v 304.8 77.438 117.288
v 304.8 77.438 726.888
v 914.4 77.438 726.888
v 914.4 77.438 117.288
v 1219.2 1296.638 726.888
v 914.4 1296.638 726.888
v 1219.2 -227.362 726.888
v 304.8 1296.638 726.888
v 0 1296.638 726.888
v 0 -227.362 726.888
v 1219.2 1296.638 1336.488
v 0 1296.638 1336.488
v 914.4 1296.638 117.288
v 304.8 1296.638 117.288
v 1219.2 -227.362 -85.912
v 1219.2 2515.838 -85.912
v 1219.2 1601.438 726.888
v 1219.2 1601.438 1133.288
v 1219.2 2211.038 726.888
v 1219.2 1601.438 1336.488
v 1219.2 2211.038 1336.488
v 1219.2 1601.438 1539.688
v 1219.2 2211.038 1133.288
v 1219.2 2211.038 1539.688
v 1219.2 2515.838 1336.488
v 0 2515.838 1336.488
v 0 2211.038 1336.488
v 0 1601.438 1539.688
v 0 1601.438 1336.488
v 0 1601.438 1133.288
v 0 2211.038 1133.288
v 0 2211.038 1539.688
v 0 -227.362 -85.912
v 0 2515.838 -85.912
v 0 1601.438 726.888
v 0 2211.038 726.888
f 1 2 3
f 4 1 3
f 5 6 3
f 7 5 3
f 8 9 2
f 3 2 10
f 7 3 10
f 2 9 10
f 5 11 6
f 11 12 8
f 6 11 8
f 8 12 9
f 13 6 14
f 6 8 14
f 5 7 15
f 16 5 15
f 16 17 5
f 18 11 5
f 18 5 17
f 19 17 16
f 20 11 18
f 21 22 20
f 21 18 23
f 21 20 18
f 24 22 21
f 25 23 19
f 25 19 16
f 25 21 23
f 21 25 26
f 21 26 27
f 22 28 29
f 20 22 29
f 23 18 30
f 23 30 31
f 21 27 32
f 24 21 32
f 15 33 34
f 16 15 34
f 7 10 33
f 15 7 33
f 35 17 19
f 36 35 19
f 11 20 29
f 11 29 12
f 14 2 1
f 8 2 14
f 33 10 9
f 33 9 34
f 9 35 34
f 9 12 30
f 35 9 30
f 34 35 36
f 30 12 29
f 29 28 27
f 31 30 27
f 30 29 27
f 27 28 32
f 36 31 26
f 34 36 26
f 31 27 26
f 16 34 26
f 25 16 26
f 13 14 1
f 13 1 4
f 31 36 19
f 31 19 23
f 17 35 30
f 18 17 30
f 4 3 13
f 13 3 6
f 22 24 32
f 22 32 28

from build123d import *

# Parameters (mm, degrees)
F1_DEPTH = 1219.2
F2_W     = 609.6
F2_H     = 406.4
F3_DEPTH = 1219.2
F4_W     = 609.6
F4_H     = 1219.2
F5_DEPTH = 609.6


with BuildPart() as f1:
    # F0 (on Right) → F1 (new body)
    with BuildSketch(Plane.YZ):
        Polygon((-227.362469, 726.887877), (-227.362469, -85.912123), (2515.837531, -85.912123), (2515.837531, 1336.487877), (2211.037531, 1336.487877), (2211.037531, 1539.687877), (1601.437531, 1539.687877), (1601.437531, 1336.487877), (1296.637531, 1336.487877), (1296.637531, 726.887877), align=None)
    extrude(amount=F1_DEPTH)

    # F2 (on face) → F3 (cut)
    with BuildSketch(Plane.YZ.offset(1219.2)):
        with Locations((1906.237531, 930.087877)):
            Rectangle(F2_W, F2_H)
    extrude(amount=-F3_DEPTH, mode=Mode.SUBTRACT)

    # F4 (on face) → F5 (cut)
    with BuildSketch(Plane.XY.offset(726.887877)):
        with Locations((609.6, 687.037531)):
            Rectangle(F4_W, F4_H)
    extrude(amount=-F5_DEPTH, mode=Mode.SUBTRACT)


solid = f1.part
